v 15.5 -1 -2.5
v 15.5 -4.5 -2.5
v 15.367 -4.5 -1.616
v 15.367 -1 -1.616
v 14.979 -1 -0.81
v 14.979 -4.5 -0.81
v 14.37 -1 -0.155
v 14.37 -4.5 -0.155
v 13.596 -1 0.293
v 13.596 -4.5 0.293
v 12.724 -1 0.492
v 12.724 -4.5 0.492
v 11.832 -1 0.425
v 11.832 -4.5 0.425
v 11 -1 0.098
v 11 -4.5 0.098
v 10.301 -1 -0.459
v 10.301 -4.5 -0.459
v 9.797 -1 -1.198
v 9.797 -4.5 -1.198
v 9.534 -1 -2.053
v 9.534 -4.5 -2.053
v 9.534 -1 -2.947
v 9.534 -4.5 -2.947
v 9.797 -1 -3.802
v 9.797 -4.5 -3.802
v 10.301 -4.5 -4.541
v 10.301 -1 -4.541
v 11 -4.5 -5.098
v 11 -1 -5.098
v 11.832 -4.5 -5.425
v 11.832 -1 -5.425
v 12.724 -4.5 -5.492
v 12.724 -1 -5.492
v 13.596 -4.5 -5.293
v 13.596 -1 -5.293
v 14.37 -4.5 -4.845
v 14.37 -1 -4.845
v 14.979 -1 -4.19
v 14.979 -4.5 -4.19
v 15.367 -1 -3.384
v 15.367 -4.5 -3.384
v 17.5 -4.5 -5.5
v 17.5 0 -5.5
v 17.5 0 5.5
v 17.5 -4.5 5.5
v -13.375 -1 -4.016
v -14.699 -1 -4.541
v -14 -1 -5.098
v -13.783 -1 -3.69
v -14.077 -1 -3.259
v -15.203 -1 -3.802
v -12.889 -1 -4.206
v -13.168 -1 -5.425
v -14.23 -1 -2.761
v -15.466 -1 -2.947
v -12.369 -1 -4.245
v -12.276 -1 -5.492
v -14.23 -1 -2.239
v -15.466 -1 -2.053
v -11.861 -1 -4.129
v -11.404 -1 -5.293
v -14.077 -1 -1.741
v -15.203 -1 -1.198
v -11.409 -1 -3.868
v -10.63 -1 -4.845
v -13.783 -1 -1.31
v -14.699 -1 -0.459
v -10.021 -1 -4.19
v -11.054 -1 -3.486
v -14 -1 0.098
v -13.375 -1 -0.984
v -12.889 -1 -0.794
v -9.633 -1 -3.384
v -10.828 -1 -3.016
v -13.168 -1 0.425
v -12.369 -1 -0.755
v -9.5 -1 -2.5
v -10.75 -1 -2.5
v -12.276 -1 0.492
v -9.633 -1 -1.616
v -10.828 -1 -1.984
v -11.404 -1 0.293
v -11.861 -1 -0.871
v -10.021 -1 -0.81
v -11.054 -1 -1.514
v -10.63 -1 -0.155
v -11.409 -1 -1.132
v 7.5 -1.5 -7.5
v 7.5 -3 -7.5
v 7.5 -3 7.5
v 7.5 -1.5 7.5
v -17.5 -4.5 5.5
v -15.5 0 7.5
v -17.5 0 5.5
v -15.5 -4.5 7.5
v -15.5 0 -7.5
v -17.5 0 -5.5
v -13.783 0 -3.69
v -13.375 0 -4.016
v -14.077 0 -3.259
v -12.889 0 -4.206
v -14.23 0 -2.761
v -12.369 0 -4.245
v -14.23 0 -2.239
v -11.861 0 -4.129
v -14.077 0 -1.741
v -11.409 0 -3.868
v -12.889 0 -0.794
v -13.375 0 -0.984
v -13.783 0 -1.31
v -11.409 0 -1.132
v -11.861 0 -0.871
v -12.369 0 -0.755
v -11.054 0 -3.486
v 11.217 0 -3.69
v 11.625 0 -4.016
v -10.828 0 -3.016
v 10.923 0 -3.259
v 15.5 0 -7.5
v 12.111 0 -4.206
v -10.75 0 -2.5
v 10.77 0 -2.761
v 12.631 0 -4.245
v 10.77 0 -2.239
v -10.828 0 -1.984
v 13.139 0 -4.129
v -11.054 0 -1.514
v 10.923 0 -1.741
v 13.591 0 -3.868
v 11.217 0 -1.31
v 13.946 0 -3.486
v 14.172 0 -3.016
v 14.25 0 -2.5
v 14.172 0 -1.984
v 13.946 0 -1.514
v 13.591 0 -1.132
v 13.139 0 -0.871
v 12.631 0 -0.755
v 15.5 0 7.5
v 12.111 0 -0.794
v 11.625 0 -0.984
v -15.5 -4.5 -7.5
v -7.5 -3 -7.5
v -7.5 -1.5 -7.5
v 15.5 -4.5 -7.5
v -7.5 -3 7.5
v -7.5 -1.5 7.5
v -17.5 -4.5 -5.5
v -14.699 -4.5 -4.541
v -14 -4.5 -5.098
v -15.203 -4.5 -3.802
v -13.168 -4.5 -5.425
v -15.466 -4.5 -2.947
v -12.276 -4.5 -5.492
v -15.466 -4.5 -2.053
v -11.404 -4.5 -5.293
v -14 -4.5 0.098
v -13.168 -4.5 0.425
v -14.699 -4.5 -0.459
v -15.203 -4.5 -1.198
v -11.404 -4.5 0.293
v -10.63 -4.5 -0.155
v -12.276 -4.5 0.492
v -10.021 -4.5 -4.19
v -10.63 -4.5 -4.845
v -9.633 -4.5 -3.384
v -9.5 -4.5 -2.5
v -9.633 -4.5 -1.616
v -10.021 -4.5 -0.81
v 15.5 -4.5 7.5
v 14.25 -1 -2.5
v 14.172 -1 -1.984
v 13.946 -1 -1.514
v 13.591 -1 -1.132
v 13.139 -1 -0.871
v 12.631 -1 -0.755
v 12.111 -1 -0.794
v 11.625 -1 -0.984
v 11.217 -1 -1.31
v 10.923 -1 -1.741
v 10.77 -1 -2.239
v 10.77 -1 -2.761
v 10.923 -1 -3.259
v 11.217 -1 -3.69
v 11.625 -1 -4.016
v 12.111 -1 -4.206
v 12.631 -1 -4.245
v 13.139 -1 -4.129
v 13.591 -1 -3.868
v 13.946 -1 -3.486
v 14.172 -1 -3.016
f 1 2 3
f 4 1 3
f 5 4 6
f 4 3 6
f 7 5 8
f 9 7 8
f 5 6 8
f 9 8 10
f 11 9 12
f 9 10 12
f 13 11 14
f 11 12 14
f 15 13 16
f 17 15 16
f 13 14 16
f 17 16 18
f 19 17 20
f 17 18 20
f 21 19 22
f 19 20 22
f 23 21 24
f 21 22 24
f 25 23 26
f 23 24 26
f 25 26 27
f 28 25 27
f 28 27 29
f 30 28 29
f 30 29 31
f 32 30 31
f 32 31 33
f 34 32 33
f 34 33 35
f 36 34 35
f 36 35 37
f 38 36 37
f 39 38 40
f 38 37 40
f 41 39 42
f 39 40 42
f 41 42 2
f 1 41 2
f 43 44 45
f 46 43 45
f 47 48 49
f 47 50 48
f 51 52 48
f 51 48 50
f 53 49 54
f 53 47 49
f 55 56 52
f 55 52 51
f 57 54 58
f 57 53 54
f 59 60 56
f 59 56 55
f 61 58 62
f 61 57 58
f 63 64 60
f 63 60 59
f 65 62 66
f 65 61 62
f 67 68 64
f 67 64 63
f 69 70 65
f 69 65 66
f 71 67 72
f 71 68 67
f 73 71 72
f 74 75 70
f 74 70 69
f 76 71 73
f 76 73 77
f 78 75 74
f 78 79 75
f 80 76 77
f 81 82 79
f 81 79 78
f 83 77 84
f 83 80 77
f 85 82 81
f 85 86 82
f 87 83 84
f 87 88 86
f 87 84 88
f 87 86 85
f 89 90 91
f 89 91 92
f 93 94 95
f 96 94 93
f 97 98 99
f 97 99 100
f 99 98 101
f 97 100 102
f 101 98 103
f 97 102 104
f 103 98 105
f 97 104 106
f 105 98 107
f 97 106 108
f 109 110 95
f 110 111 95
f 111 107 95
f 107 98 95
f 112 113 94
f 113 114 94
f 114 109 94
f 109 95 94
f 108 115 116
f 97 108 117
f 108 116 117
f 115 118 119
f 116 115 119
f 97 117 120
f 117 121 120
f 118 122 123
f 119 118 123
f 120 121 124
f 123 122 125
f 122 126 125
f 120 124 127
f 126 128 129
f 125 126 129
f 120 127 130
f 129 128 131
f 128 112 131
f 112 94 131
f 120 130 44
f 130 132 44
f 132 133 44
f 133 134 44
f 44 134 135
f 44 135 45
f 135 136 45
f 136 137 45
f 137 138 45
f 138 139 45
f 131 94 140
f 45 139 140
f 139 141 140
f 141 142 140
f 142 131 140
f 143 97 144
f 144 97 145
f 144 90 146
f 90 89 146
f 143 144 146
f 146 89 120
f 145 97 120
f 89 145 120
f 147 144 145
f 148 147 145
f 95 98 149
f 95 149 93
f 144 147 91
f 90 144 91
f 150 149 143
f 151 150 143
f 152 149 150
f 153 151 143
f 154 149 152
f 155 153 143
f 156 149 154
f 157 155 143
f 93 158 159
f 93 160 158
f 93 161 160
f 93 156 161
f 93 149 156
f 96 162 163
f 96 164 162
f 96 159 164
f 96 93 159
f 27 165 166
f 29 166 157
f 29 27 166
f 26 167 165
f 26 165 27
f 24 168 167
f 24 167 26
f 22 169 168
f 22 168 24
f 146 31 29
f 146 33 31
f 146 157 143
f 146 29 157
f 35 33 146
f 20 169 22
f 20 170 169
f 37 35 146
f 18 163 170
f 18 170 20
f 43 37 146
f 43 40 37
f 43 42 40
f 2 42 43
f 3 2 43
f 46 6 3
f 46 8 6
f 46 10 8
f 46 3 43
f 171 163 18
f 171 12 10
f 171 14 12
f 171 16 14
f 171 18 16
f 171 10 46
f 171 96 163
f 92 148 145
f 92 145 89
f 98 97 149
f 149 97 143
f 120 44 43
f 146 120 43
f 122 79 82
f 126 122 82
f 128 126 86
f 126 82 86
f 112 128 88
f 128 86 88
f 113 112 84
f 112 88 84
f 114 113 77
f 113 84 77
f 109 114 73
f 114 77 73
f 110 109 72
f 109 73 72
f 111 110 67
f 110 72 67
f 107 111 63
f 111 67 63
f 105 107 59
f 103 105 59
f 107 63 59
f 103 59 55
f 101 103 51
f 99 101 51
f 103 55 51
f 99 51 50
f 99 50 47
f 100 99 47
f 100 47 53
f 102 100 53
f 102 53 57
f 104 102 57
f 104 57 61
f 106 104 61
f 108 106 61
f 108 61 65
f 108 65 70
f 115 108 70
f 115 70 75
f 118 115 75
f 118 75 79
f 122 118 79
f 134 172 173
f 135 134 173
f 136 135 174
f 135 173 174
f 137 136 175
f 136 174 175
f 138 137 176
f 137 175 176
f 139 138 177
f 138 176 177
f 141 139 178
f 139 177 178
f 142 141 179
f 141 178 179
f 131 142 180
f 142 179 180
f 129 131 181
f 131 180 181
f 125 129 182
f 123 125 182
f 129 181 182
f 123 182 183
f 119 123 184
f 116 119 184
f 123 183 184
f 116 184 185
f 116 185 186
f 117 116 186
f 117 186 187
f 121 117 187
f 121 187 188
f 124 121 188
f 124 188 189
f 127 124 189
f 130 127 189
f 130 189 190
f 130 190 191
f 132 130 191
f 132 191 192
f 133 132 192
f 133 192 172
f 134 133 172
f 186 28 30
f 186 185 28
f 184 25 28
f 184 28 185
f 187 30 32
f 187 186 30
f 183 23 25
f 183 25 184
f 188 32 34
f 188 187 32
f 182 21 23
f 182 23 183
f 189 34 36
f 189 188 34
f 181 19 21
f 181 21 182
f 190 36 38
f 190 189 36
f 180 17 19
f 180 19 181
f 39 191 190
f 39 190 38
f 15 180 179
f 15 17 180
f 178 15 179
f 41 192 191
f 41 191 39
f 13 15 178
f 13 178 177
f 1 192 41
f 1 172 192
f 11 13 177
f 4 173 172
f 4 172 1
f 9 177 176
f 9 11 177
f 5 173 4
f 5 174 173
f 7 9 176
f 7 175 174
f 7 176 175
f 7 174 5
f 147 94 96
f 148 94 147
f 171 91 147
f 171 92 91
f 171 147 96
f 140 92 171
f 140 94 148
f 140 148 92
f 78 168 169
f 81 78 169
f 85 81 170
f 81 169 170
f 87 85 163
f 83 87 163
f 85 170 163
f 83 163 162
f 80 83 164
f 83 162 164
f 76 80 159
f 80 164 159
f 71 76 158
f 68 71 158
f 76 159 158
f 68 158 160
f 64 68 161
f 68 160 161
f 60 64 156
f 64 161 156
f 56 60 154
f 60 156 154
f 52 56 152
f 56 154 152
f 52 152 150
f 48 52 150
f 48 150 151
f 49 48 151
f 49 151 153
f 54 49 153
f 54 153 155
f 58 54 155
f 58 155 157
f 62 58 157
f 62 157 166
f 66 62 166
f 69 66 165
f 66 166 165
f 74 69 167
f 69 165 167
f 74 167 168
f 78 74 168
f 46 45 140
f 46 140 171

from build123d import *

# Parameters (mm, degrees)
F0_W     = 35
F0_H     = 15
F1_DEPTH = 4.5
F2_W     = 15
F2_H     = 1.5
F3_DEPTH = 15.001
F4_R     = 3
F5_DEPTH = 3.5
F6_R     = 1.75
F7_DEPTH = 4.501
F8_SIZE  = 2


with BuildPart() as f1:
    # F0 (on Front) → F1 (new body)
    with BuildSketch(Plane.XZ):
        Rectangle(F0_W, F0_H)
    extrude(amount=F1_DEPTH)

    # F2 (on face) → F3 (cut, through all)
    with BuildSketch(Plane.XY.offset(7.5)):
        with Locations((0, -2.25)):
            Rectangle(F2_W, F2_H)
    extrude(amount=-F3_DEPTH, mode=Mode.SUBTRACT)

    # F4 (on face) → F5 (cut)
    with BuildSketch(Plane.XZ.offset(4.5)):
        with Locations((12.5, -2.5)):
            Circle(F4_R)
        with Locations((-12.5, -2.5)):
            Circle(F4_R)
    extrude(amount=-F5_DEPTH, mode=Mode.SUBTRACT)

    # F6 (on face) → F7 (cut, through all)
    with BuildSketch(Plane.XZ.offset(4.5)):
        with Locations((12.5, -2.5)):
            Circle(F6_R)
        with Locations((-12.5, -2.5)):
            Circle(F6_R)
    extrude(amount=-F7_DEPTH, mode=Mode.SUBTRACT)

    # F8
    f8_edges = [f1.edges().sort_by_distance(p)[0] for p in [
        (-17.5, -2.25, 7.5),
        (17.5, -2.25, 7.5),
        (17.5, -2.25, -7.5),
        (-17.5, -2.25, -7.5),
    ]]
    chamfer(f8_edges, length=F8_SIZE)


solid = f1.part
